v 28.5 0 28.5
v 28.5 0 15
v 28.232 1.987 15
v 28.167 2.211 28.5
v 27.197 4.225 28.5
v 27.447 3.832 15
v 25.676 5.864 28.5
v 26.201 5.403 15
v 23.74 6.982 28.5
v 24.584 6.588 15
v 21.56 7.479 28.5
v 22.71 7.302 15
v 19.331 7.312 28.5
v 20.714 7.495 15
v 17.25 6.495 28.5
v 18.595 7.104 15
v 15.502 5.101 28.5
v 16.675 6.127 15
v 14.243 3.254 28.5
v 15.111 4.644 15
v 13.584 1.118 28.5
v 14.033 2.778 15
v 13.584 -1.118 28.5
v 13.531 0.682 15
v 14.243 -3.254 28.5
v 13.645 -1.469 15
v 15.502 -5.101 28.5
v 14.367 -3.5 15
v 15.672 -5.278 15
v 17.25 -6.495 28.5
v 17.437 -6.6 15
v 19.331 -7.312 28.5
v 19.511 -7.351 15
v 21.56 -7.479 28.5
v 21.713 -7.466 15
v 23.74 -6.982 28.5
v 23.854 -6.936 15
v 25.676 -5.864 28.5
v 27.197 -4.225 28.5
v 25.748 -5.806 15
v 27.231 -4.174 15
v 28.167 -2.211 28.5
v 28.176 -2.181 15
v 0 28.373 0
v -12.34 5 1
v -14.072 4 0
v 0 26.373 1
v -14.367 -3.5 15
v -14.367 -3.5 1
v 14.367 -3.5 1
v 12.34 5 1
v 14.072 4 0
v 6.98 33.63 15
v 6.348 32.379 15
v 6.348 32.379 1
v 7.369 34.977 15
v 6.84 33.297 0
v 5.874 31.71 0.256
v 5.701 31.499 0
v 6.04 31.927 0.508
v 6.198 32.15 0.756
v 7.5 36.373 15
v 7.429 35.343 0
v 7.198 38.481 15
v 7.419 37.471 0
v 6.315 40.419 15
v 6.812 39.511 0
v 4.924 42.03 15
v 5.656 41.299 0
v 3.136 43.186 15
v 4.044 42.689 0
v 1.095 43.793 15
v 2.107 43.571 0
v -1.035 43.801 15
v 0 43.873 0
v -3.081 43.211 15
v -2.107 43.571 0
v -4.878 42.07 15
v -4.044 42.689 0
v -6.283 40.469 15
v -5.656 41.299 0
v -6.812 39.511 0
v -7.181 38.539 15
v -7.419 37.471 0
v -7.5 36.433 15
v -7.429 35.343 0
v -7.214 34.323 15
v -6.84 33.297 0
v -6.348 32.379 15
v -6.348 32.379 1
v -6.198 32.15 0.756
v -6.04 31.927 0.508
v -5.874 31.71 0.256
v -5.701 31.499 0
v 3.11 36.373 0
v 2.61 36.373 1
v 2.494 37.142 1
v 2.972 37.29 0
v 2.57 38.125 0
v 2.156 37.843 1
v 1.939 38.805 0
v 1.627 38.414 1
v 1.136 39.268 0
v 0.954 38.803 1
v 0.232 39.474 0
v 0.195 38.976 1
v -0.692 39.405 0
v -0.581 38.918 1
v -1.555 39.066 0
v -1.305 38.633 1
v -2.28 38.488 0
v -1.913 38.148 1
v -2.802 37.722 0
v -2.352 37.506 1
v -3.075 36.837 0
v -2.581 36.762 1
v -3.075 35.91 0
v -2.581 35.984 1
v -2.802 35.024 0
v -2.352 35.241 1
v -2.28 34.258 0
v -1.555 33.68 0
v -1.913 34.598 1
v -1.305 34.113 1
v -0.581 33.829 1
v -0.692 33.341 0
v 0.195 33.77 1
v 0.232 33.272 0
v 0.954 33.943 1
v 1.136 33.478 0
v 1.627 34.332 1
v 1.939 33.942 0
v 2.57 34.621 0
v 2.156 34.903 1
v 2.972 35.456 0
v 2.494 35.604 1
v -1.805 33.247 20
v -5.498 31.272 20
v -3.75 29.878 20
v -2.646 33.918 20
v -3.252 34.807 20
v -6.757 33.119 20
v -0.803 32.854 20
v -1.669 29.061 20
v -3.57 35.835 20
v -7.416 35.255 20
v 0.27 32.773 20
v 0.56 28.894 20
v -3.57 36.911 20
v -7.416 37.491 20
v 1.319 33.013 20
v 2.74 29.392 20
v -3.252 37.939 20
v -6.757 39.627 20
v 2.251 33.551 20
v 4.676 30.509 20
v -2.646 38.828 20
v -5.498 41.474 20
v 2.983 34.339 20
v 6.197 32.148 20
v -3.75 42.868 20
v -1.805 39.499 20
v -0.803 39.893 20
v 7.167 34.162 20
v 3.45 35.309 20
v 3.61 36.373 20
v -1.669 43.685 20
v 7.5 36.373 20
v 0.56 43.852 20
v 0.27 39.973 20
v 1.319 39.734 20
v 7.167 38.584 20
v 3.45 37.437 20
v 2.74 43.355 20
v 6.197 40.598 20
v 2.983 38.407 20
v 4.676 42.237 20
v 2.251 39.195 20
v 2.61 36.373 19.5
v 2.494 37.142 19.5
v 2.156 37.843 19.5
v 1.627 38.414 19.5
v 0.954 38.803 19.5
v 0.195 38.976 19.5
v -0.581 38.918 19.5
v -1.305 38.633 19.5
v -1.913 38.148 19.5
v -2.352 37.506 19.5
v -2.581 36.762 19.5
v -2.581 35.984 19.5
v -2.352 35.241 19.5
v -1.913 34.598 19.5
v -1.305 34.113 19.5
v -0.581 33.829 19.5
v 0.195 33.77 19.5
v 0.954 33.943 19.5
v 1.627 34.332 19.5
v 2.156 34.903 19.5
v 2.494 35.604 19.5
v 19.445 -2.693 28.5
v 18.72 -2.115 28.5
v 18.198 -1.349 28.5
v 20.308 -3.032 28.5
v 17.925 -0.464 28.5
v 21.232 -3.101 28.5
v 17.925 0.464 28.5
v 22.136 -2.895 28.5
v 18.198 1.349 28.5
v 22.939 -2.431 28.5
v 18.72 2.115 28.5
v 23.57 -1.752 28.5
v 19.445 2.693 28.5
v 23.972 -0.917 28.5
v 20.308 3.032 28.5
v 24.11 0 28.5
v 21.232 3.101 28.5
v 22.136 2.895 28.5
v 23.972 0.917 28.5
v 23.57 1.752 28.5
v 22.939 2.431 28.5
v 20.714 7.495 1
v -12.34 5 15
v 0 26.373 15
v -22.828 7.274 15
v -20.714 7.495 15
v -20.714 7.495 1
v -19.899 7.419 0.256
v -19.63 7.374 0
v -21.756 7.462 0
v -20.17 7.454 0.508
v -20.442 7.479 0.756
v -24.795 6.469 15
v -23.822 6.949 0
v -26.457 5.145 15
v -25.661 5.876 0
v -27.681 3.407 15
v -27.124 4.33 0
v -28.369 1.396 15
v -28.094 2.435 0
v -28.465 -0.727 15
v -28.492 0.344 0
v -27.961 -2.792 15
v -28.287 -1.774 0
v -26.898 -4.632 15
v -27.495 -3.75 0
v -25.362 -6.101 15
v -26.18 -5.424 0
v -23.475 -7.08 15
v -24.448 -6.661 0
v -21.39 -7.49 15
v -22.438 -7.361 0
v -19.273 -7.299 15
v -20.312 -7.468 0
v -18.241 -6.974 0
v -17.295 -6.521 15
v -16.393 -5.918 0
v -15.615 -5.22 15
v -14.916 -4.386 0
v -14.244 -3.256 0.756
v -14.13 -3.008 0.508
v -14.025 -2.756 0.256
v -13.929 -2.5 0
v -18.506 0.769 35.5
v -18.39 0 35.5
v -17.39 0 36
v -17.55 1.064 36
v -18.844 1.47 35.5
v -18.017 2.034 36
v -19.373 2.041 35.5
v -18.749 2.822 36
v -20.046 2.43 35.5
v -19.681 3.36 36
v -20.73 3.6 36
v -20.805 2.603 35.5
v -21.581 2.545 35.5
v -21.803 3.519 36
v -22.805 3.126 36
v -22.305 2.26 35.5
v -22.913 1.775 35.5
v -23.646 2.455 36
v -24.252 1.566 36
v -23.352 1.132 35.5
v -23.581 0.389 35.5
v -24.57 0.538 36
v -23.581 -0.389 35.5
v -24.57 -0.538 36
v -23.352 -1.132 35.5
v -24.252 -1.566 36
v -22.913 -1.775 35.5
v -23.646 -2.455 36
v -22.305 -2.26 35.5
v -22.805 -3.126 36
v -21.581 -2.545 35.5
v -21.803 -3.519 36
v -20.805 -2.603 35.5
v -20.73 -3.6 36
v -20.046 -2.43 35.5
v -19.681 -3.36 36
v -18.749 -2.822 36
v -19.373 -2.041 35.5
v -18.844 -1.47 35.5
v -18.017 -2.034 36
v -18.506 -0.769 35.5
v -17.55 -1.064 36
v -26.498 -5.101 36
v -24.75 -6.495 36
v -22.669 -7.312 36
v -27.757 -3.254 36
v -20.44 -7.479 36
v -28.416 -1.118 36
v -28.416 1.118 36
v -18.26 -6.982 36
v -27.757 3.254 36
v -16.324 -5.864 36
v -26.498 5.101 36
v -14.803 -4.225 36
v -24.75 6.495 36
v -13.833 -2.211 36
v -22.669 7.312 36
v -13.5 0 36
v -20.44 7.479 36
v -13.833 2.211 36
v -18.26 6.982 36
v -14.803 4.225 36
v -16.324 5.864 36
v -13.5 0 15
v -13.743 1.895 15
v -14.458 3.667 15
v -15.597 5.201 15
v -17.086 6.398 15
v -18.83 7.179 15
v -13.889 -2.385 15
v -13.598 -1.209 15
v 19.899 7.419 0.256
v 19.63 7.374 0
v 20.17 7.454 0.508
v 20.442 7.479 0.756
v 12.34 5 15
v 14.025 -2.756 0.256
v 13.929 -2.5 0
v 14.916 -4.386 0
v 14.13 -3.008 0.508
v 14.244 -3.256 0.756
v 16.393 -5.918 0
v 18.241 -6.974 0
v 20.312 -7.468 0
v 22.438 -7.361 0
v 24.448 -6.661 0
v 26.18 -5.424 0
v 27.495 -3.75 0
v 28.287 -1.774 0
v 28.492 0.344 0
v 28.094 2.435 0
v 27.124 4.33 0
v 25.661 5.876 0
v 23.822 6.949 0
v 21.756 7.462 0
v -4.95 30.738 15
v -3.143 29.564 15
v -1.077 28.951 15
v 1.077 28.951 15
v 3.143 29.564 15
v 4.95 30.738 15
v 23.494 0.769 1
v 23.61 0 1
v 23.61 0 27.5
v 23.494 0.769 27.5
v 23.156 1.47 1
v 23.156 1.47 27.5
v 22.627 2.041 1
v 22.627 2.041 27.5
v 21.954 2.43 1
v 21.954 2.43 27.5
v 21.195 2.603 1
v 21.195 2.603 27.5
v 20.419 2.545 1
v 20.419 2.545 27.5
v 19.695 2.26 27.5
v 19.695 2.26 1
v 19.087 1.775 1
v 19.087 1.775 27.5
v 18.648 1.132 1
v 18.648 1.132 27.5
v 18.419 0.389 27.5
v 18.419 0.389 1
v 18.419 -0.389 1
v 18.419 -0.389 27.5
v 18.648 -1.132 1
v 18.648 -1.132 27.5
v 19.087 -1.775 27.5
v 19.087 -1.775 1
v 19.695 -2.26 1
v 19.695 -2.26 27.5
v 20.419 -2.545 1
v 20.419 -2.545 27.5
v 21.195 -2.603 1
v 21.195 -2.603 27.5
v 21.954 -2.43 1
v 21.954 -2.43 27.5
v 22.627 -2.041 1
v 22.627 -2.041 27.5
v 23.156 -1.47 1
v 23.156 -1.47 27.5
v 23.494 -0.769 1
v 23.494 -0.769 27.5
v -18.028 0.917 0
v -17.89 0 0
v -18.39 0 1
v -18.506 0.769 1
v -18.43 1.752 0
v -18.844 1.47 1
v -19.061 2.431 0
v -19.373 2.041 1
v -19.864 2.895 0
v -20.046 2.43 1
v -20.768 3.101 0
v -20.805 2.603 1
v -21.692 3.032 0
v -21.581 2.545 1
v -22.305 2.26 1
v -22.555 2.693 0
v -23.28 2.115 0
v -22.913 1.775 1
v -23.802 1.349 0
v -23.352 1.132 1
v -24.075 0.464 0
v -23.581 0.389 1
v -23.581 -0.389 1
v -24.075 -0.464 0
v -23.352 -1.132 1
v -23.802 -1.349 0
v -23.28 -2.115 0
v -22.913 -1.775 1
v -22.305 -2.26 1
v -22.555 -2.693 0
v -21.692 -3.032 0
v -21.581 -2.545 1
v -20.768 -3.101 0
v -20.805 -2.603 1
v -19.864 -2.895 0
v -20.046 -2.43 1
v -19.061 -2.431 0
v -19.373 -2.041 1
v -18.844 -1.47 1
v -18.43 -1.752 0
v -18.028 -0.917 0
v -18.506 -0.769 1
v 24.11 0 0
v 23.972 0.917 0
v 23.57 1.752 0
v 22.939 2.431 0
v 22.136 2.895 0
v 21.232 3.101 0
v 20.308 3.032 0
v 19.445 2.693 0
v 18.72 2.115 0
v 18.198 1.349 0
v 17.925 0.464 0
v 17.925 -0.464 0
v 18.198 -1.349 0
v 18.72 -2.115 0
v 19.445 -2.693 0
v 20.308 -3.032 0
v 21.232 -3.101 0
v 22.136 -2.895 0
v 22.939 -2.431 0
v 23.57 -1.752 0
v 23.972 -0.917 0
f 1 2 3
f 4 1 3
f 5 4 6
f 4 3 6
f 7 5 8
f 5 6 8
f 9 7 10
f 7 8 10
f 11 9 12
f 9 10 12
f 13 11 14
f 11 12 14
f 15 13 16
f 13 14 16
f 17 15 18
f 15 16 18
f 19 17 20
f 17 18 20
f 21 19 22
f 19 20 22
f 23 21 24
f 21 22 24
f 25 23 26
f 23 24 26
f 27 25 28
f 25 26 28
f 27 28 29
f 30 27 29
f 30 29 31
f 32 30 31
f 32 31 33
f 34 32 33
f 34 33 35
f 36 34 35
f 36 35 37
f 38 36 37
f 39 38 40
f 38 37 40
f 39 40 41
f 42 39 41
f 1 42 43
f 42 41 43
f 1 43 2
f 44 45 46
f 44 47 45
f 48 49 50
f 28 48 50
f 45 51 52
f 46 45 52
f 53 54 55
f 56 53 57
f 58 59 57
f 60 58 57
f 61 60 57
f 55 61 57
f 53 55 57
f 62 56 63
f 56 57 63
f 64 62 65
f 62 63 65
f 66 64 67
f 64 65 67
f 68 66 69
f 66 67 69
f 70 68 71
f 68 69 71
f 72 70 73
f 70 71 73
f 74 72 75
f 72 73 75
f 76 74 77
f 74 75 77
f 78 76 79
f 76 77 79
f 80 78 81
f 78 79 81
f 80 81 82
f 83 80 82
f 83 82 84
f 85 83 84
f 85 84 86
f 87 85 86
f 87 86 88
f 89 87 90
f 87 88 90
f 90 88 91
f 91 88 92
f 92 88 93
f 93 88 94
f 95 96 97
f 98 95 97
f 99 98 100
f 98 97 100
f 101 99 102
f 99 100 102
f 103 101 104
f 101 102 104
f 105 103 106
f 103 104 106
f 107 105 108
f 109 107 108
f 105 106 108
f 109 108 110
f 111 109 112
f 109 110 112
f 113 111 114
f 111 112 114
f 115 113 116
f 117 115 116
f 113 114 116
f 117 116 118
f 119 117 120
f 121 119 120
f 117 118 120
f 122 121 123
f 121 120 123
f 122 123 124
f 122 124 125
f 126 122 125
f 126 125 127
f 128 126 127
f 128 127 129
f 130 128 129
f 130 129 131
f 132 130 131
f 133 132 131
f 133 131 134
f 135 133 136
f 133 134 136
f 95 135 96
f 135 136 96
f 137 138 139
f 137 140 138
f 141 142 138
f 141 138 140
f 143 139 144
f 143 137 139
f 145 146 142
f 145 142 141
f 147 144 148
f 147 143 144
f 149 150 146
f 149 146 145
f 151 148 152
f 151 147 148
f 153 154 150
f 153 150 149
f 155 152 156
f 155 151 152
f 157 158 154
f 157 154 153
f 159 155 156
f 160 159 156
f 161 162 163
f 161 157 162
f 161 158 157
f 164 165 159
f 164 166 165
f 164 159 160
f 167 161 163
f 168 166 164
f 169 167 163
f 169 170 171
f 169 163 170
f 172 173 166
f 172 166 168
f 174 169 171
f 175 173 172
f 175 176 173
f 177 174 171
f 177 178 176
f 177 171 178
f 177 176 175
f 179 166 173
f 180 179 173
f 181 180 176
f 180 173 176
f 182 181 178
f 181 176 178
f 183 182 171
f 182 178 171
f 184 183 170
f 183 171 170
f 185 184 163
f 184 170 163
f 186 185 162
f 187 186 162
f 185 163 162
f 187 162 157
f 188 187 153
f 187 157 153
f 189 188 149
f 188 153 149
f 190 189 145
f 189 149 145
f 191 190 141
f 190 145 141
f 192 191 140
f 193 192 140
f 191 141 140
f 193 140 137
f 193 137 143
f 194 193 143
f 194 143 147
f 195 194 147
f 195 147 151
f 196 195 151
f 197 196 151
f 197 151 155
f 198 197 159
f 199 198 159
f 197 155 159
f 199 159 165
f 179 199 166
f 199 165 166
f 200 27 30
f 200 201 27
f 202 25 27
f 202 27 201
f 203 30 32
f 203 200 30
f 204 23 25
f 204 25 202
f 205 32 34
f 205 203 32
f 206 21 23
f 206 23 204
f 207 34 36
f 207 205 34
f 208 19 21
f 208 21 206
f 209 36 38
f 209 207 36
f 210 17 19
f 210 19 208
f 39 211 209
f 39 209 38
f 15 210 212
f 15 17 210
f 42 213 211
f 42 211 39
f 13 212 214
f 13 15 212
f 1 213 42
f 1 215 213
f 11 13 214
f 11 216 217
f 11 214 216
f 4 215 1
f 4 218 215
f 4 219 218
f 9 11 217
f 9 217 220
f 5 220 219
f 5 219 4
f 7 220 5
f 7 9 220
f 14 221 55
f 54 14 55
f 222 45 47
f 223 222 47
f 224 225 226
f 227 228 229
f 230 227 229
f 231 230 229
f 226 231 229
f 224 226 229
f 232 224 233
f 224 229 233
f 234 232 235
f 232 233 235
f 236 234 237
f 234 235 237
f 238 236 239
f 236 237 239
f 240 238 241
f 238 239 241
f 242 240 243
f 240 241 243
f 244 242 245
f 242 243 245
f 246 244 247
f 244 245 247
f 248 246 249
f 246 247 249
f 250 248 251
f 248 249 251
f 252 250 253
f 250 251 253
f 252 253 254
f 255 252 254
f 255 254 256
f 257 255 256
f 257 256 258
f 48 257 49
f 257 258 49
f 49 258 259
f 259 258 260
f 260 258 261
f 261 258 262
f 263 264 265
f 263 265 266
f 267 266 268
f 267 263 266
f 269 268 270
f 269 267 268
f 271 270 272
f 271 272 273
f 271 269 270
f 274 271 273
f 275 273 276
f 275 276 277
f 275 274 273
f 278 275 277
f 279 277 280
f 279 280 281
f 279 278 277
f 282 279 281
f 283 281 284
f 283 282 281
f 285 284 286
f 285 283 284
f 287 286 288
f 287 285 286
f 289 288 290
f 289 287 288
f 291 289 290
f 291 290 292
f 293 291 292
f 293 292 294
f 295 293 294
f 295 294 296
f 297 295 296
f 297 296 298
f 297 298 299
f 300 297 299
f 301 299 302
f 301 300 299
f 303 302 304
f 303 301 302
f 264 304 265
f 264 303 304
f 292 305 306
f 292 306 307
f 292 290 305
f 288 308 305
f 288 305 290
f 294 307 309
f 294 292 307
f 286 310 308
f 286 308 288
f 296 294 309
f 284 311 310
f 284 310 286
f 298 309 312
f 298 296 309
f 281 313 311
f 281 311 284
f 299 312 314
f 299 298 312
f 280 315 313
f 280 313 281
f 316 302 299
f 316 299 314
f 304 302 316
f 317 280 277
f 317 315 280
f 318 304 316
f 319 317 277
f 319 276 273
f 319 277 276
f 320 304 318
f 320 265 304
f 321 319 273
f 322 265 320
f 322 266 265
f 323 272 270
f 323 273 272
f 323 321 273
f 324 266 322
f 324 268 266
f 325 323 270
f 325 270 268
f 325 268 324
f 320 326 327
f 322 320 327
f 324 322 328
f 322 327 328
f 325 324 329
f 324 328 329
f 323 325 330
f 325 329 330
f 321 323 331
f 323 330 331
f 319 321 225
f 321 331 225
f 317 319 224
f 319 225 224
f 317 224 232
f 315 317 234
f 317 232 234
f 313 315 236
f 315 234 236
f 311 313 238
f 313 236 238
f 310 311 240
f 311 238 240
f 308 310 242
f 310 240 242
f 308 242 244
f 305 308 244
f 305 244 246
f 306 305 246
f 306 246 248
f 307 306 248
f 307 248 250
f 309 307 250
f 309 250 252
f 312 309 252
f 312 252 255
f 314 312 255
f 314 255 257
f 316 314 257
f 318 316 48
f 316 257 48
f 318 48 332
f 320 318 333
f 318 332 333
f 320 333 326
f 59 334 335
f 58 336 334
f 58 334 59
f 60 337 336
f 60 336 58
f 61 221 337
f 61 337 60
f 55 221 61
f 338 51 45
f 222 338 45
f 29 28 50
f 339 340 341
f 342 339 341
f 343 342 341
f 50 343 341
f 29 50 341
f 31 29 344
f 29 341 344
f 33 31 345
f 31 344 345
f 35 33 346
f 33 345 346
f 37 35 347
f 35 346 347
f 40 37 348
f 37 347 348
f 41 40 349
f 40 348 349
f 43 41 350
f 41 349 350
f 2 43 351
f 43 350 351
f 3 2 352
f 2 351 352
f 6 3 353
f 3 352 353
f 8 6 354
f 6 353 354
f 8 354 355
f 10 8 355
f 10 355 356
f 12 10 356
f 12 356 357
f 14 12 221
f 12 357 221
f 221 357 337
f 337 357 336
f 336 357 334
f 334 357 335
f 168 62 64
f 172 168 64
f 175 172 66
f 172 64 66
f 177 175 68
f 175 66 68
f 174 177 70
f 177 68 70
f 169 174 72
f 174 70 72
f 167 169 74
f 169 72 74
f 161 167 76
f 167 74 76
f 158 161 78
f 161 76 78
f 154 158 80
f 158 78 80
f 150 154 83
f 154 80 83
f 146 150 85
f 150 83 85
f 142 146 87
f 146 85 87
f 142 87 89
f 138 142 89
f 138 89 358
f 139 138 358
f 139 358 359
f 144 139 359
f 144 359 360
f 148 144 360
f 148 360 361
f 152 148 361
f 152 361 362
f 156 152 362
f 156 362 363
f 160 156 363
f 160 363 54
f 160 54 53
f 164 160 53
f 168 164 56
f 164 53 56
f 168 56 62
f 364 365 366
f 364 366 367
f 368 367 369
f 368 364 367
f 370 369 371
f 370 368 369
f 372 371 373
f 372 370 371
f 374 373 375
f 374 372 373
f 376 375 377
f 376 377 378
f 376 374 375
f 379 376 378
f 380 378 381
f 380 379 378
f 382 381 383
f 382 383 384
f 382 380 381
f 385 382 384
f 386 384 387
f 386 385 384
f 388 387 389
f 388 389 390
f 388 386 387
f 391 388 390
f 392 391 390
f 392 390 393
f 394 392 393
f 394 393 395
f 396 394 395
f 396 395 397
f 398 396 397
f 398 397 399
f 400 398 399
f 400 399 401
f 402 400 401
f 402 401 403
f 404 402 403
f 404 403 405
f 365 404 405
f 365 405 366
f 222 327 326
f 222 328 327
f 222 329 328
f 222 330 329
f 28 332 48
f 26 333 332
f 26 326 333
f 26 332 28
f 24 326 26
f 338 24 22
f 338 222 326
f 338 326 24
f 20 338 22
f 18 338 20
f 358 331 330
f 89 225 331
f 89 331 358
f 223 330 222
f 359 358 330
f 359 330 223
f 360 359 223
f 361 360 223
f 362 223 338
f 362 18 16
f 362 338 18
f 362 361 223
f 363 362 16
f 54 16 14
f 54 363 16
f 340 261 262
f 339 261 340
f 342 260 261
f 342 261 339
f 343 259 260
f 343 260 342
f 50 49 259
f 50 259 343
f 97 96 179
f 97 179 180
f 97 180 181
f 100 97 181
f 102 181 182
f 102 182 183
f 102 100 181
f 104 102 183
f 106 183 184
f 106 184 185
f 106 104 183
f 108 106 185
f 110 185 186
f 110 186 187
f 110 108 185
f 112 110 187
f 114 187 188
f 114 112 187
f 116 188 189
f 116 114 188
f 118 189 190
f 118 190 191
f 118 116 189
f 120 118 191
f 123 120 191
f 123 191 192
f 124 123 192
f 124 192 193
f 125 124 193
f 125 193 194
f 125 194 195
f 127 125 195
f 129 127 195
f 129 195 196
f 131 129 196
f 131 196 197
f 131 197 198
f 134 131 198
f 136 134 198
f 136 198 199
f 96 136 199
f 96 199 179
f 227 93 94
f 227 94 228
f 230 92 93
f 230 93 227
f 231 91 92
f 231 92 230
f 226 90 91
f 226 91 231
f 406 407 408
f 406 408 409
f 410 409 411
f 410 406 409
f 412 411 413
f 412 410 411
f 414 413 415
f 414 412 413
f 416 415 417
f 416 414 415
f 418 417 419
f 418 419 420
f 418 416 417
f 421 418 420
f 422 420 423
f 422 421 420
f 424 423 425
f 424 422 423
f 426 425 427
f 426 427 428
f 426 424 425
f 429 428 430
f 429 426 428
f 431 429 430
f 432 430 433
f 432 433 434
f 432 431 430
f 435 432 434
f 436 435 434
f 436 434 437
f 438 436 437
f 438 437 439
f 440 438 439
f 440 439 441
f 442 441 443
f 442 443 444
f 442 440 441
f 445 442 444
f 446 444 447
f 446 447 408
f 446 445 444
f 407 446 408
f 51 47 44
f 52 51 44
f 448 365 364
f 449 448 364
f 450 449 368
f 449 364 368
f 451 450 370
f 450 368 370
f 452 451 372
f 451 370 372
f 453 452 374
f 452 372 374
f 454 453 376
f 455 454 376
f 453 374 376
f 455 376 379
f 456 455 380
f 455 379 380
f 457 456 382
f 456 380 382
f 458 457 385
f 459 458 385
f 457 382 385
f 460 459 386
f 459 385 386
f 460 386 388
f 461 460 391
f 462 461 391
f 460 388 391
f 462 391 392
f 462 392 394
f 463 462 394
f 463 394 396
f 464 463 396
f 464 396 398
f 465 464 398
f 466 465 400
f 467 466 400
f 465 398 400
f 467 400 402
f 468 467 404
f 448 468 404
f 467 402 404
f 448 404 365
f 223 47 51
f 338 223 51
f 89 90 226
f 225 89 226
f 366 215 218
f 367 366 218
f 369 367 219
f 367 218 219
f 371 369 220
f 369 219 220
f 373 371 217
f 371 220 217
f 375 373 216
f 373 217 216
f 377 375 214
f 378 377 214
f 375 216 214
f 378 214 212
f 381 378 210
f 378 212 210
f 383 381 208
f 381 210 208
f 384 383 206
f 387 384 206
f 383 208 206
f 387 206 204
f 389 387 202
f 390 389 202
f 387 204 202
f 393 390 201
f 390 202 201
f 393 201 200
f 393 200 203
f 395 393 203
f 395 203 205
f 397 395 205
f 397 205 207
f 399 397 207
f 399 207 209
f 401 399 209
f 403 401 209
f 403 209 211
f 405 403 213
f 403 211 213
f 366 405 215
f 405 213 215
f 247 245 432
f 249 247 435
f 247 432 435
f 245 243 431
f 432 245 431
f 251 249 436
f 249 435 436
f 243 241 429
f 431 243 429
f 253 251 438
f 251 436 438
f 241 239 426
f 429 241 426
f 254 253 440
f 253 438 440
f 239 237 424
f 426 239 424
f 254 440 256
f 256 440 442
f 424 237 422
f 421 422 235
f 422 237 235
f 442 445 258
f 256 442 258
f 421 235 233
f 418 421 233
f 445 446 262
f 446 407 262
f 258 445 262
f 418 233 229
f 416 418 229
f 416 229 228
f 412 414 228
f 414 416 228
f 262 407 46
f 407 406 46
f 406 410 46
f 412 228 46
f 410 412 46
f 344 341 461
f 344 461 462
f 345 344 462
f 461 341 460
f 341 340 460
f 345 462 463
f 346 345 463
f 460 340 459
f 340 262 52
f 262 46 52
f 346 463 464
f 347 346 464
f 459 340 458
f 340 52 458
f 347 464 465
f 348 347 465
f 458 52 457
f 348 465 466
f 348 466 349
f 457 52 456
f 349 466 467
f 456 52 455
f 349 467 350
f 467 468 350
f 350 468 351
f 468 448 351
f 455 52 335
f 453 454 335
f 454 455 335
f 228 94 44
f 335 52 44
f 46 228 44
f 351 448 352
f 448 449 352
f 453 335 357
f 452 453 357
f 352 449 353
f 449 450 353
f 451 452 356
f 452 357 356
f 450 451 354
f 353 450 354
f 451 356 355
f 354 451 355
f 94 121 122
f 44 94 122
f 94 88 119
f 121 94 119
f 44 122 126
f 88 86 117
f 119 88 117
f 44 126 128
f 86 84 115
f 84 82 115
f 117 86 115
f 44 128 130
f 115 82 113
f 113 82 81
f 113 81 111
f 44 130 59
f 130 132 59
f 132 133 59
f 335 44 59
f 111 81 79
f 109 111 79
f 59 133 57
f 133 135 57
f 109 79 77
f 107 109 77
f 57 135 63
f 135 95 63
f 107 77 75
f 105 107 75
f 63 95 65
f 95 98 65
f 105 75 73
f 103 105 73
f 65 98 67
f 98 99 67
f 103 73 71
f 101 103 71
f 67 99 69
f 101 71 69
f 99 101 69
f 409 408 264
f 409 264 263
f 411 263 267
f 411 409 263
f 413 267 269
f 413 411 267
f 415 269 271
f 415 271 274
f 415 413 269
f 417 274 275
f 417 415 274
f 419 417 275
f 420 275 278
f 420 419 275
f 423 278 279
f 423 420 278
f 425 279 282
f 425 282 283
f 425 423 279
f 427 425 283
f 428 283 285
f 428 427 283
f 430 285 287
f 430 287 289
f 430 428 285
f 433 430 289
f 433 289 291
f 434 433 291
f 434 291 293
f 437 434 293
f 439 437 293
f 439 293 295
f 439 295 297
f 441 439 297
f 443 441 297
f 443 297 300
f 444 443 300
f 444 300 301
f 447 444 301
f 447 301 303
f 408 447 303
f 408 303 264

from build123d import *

# Parameters (mm, degrees)
F0_R        = 2.61
F1_DEPTH    = 15
F2_R        = 7.5
F2_R_2      = 2.61
F3_DEPTH    = 5
F4_R        = 7.5
F4_R_2      = 2.61
F5_DEPTH    = 13.5
F6_R        = 7.5
F6_R_2      = 2.61
F7_DEPTH    = 21
F8_C1_SIZE2 = 0.5
F8_C1_SIZE  = 1
F8_C2_SIZE2 = 0.5
F8_C2_SIZE  = 1
F8_C3_SIZE2 = 1
F8_C3_SIZE  = 0.5
F8_C4_SIZE2 = 1
F8_C4_SIZE  = 0.5
F8_C5_SIZE2 = 1
F8_C5_SIZE  = 0.5
F8_C6_SIZE2 = 0.5
F8_C6_SIZE  = 1
F9_SIZE     = 1


with BuildPart() as f1:
    # F0 (on Top) → F1 (new body)
    with BuildSketch(Plane.XY):
        with BuildLine():
            Line((20.7144641229, 7.4945626465), (6.3477137036, 32.3785043124))
            ThreePointArc((6.3477137036, 32.3785043124), (0, 43.8730669589), (-6.3477137036, 32.3785043124))
            Line((-6.3477137036, 32.3785043124), (-20.7144641229, 7.4945626465))
            ThreePointArc((-20.7144641229, 7.4945626465), (-27.4951905284, -3.75), (-14.3667504193, -3.5))
            Line((-14.3667504193, -3.5), (14.3667504193, -3.5))
            ThreePointArc((14.3667504193, -3.5), (27.4951905284, -3.75), (20.7144641229, 7.4945626465))
        make_face()
        with Locations((-21, 0)):
            Circle(F0_R, mode=Mode.SUBTRACT)
        with Locations((21, 0)):
            Circle(F0_R, mode=Mode.SUBTRACT)
        Polygon((12.3397459622, 5), (-12.3397459622, 5), (0, 26.3730669589), align=None, mode=Mode.SUBTRACT)
        with Locations((0, 36.3730669589)):
            Circle(F0_R, mode=Mode.SUBTRACT)
    extrude(amount=F1_DEPTH)

    # F2 (on face) → F3 (join)
    with BuildSketch(Plane.XY.offset(15)):
        with Locations((0, 36.3730669589)):
            Circle(F2_R)
        with Locations((0, 36.3730669589)):
            Circle(F2_R_2, mode=Mode.SUBTRACT)
    extrude(amount=F3_DEPTH)

    # F4 (on face) → F5 (join)
    with BuildSketch(Plane.XY.offset(15)):
        with Locations((21, 0)):
            Circle(F4_R)
        with Locations((21, 0)):
            Circle(F4_R_2, mode=Mode.SUBTRACT)
    extrude(amount=F5_DEPTH)

    # F6 (on face) → F7 (join)
    with BuildSketch(Plane.XY.offset(15)):
        with Locations((-21, 0)):
            Circle(F6_R)
        with Locations((-21, 0)):
            Circle(F6_R_2, mode=Mode.SUBTRACT)
    extrude(amount=F7_DEPTH)

    # F8: chamfer of 0.5 x 1 on 6 edges, made by hand

    # F8_c1
    f8_c1_edges = [f1.edges().sort_by_distance(p)[0] for p in [
        (-23.61, 0, 36),
    ]]
    f8_c1_side = f1.faces().sort_by_distance((-23.62, 0, 36))[0]
    chamfer(f8_c1_edges, length=F8_C1_SIZE, length2=F8_C1_SIZE2, reference=f8_c1_side)

    # F8_c2
    f8_c2_edges = [f1.edges().sort_by_distance(p)[0] for p in [
        (-23.61, 0, 0),
    ]]
    f8_c2_side = f1.faces().sort_by_distance((-23.61, 0, 0.01))[0]
    chamfer(f8_c2_edges, length=F8_C2_SIZE, length2=F8_C2_SIZE2, reference=f8_c2_side)

    # F8_c3
    f8_c3_edges = [f1.edges().sort_by_distance(p)[0] for p in [
        (18.39, 0, 0),
    ]]
    f8_c3_side = f1.faces().sort_by_distance((18.38, 0, 0))[0]
    chamfer(f8_c3_edges, length=F8_C3_SIZE, length2=F8_C3_SIZE2, reference=f8_c3_side)

    # F8_c4
    f8_c4_edges = [f1.edges().sort_by_distance(p)[0] for p in [
        (-2.61, 36.3730669589, 0),
    ]]
    f8_c4_side = f1.faces().sort_by_distance((-2.62, 36.3730669589, 0))[0]
    chamfer(f8_c4_edges, length=F8_C4_SIZE, length2=F8_C4_SIZE2, reference=f8_c4_side)

    # F8_c5
    f8_c5_edges = [f1.edges().sort_by_distance(p)[0] for p in [
        (-2.61, 36.3730669589, 20),
    ]]
    f8_c5_side = f1.faces().sort_by_distance((-2.61, 36.3730669589, 19.99))[0]
    chamfer(f8_c5_edges, length=F8_C5_SIZE, length2=F8_C5_SIZE2, reference=f8_c5_side)

    # F8_c6
    f8_c6_edges = [f1.edges().sort_by_distance(p)[0] for p in [
        (18.39, 0, 28.5),
    ]]
    f8_c6_side = f1.faces().sort_by_distance((18.39, 0, 28.49))[0]
    chamfer(f8_c6_edges, length=F8_C6_SIZE, length2=F8_C6_SIZE2, reference=f8_c6_side)

    # F9
    f9_edges = [f1.edges().sort_by_distance(p)[0] for p in [
        (6.169873, 15.686533, 0),
        (0, 5, 0),
        (-6.169873, 15.686533, 0),
        (0, -3.5, 0),
        (-13.531089, 19.936533, 0),
        (13.531089, 19.936533, 0),
    ]]
    chamfer(f9_edges, length=F9_SIZE)


solid = f1.part
